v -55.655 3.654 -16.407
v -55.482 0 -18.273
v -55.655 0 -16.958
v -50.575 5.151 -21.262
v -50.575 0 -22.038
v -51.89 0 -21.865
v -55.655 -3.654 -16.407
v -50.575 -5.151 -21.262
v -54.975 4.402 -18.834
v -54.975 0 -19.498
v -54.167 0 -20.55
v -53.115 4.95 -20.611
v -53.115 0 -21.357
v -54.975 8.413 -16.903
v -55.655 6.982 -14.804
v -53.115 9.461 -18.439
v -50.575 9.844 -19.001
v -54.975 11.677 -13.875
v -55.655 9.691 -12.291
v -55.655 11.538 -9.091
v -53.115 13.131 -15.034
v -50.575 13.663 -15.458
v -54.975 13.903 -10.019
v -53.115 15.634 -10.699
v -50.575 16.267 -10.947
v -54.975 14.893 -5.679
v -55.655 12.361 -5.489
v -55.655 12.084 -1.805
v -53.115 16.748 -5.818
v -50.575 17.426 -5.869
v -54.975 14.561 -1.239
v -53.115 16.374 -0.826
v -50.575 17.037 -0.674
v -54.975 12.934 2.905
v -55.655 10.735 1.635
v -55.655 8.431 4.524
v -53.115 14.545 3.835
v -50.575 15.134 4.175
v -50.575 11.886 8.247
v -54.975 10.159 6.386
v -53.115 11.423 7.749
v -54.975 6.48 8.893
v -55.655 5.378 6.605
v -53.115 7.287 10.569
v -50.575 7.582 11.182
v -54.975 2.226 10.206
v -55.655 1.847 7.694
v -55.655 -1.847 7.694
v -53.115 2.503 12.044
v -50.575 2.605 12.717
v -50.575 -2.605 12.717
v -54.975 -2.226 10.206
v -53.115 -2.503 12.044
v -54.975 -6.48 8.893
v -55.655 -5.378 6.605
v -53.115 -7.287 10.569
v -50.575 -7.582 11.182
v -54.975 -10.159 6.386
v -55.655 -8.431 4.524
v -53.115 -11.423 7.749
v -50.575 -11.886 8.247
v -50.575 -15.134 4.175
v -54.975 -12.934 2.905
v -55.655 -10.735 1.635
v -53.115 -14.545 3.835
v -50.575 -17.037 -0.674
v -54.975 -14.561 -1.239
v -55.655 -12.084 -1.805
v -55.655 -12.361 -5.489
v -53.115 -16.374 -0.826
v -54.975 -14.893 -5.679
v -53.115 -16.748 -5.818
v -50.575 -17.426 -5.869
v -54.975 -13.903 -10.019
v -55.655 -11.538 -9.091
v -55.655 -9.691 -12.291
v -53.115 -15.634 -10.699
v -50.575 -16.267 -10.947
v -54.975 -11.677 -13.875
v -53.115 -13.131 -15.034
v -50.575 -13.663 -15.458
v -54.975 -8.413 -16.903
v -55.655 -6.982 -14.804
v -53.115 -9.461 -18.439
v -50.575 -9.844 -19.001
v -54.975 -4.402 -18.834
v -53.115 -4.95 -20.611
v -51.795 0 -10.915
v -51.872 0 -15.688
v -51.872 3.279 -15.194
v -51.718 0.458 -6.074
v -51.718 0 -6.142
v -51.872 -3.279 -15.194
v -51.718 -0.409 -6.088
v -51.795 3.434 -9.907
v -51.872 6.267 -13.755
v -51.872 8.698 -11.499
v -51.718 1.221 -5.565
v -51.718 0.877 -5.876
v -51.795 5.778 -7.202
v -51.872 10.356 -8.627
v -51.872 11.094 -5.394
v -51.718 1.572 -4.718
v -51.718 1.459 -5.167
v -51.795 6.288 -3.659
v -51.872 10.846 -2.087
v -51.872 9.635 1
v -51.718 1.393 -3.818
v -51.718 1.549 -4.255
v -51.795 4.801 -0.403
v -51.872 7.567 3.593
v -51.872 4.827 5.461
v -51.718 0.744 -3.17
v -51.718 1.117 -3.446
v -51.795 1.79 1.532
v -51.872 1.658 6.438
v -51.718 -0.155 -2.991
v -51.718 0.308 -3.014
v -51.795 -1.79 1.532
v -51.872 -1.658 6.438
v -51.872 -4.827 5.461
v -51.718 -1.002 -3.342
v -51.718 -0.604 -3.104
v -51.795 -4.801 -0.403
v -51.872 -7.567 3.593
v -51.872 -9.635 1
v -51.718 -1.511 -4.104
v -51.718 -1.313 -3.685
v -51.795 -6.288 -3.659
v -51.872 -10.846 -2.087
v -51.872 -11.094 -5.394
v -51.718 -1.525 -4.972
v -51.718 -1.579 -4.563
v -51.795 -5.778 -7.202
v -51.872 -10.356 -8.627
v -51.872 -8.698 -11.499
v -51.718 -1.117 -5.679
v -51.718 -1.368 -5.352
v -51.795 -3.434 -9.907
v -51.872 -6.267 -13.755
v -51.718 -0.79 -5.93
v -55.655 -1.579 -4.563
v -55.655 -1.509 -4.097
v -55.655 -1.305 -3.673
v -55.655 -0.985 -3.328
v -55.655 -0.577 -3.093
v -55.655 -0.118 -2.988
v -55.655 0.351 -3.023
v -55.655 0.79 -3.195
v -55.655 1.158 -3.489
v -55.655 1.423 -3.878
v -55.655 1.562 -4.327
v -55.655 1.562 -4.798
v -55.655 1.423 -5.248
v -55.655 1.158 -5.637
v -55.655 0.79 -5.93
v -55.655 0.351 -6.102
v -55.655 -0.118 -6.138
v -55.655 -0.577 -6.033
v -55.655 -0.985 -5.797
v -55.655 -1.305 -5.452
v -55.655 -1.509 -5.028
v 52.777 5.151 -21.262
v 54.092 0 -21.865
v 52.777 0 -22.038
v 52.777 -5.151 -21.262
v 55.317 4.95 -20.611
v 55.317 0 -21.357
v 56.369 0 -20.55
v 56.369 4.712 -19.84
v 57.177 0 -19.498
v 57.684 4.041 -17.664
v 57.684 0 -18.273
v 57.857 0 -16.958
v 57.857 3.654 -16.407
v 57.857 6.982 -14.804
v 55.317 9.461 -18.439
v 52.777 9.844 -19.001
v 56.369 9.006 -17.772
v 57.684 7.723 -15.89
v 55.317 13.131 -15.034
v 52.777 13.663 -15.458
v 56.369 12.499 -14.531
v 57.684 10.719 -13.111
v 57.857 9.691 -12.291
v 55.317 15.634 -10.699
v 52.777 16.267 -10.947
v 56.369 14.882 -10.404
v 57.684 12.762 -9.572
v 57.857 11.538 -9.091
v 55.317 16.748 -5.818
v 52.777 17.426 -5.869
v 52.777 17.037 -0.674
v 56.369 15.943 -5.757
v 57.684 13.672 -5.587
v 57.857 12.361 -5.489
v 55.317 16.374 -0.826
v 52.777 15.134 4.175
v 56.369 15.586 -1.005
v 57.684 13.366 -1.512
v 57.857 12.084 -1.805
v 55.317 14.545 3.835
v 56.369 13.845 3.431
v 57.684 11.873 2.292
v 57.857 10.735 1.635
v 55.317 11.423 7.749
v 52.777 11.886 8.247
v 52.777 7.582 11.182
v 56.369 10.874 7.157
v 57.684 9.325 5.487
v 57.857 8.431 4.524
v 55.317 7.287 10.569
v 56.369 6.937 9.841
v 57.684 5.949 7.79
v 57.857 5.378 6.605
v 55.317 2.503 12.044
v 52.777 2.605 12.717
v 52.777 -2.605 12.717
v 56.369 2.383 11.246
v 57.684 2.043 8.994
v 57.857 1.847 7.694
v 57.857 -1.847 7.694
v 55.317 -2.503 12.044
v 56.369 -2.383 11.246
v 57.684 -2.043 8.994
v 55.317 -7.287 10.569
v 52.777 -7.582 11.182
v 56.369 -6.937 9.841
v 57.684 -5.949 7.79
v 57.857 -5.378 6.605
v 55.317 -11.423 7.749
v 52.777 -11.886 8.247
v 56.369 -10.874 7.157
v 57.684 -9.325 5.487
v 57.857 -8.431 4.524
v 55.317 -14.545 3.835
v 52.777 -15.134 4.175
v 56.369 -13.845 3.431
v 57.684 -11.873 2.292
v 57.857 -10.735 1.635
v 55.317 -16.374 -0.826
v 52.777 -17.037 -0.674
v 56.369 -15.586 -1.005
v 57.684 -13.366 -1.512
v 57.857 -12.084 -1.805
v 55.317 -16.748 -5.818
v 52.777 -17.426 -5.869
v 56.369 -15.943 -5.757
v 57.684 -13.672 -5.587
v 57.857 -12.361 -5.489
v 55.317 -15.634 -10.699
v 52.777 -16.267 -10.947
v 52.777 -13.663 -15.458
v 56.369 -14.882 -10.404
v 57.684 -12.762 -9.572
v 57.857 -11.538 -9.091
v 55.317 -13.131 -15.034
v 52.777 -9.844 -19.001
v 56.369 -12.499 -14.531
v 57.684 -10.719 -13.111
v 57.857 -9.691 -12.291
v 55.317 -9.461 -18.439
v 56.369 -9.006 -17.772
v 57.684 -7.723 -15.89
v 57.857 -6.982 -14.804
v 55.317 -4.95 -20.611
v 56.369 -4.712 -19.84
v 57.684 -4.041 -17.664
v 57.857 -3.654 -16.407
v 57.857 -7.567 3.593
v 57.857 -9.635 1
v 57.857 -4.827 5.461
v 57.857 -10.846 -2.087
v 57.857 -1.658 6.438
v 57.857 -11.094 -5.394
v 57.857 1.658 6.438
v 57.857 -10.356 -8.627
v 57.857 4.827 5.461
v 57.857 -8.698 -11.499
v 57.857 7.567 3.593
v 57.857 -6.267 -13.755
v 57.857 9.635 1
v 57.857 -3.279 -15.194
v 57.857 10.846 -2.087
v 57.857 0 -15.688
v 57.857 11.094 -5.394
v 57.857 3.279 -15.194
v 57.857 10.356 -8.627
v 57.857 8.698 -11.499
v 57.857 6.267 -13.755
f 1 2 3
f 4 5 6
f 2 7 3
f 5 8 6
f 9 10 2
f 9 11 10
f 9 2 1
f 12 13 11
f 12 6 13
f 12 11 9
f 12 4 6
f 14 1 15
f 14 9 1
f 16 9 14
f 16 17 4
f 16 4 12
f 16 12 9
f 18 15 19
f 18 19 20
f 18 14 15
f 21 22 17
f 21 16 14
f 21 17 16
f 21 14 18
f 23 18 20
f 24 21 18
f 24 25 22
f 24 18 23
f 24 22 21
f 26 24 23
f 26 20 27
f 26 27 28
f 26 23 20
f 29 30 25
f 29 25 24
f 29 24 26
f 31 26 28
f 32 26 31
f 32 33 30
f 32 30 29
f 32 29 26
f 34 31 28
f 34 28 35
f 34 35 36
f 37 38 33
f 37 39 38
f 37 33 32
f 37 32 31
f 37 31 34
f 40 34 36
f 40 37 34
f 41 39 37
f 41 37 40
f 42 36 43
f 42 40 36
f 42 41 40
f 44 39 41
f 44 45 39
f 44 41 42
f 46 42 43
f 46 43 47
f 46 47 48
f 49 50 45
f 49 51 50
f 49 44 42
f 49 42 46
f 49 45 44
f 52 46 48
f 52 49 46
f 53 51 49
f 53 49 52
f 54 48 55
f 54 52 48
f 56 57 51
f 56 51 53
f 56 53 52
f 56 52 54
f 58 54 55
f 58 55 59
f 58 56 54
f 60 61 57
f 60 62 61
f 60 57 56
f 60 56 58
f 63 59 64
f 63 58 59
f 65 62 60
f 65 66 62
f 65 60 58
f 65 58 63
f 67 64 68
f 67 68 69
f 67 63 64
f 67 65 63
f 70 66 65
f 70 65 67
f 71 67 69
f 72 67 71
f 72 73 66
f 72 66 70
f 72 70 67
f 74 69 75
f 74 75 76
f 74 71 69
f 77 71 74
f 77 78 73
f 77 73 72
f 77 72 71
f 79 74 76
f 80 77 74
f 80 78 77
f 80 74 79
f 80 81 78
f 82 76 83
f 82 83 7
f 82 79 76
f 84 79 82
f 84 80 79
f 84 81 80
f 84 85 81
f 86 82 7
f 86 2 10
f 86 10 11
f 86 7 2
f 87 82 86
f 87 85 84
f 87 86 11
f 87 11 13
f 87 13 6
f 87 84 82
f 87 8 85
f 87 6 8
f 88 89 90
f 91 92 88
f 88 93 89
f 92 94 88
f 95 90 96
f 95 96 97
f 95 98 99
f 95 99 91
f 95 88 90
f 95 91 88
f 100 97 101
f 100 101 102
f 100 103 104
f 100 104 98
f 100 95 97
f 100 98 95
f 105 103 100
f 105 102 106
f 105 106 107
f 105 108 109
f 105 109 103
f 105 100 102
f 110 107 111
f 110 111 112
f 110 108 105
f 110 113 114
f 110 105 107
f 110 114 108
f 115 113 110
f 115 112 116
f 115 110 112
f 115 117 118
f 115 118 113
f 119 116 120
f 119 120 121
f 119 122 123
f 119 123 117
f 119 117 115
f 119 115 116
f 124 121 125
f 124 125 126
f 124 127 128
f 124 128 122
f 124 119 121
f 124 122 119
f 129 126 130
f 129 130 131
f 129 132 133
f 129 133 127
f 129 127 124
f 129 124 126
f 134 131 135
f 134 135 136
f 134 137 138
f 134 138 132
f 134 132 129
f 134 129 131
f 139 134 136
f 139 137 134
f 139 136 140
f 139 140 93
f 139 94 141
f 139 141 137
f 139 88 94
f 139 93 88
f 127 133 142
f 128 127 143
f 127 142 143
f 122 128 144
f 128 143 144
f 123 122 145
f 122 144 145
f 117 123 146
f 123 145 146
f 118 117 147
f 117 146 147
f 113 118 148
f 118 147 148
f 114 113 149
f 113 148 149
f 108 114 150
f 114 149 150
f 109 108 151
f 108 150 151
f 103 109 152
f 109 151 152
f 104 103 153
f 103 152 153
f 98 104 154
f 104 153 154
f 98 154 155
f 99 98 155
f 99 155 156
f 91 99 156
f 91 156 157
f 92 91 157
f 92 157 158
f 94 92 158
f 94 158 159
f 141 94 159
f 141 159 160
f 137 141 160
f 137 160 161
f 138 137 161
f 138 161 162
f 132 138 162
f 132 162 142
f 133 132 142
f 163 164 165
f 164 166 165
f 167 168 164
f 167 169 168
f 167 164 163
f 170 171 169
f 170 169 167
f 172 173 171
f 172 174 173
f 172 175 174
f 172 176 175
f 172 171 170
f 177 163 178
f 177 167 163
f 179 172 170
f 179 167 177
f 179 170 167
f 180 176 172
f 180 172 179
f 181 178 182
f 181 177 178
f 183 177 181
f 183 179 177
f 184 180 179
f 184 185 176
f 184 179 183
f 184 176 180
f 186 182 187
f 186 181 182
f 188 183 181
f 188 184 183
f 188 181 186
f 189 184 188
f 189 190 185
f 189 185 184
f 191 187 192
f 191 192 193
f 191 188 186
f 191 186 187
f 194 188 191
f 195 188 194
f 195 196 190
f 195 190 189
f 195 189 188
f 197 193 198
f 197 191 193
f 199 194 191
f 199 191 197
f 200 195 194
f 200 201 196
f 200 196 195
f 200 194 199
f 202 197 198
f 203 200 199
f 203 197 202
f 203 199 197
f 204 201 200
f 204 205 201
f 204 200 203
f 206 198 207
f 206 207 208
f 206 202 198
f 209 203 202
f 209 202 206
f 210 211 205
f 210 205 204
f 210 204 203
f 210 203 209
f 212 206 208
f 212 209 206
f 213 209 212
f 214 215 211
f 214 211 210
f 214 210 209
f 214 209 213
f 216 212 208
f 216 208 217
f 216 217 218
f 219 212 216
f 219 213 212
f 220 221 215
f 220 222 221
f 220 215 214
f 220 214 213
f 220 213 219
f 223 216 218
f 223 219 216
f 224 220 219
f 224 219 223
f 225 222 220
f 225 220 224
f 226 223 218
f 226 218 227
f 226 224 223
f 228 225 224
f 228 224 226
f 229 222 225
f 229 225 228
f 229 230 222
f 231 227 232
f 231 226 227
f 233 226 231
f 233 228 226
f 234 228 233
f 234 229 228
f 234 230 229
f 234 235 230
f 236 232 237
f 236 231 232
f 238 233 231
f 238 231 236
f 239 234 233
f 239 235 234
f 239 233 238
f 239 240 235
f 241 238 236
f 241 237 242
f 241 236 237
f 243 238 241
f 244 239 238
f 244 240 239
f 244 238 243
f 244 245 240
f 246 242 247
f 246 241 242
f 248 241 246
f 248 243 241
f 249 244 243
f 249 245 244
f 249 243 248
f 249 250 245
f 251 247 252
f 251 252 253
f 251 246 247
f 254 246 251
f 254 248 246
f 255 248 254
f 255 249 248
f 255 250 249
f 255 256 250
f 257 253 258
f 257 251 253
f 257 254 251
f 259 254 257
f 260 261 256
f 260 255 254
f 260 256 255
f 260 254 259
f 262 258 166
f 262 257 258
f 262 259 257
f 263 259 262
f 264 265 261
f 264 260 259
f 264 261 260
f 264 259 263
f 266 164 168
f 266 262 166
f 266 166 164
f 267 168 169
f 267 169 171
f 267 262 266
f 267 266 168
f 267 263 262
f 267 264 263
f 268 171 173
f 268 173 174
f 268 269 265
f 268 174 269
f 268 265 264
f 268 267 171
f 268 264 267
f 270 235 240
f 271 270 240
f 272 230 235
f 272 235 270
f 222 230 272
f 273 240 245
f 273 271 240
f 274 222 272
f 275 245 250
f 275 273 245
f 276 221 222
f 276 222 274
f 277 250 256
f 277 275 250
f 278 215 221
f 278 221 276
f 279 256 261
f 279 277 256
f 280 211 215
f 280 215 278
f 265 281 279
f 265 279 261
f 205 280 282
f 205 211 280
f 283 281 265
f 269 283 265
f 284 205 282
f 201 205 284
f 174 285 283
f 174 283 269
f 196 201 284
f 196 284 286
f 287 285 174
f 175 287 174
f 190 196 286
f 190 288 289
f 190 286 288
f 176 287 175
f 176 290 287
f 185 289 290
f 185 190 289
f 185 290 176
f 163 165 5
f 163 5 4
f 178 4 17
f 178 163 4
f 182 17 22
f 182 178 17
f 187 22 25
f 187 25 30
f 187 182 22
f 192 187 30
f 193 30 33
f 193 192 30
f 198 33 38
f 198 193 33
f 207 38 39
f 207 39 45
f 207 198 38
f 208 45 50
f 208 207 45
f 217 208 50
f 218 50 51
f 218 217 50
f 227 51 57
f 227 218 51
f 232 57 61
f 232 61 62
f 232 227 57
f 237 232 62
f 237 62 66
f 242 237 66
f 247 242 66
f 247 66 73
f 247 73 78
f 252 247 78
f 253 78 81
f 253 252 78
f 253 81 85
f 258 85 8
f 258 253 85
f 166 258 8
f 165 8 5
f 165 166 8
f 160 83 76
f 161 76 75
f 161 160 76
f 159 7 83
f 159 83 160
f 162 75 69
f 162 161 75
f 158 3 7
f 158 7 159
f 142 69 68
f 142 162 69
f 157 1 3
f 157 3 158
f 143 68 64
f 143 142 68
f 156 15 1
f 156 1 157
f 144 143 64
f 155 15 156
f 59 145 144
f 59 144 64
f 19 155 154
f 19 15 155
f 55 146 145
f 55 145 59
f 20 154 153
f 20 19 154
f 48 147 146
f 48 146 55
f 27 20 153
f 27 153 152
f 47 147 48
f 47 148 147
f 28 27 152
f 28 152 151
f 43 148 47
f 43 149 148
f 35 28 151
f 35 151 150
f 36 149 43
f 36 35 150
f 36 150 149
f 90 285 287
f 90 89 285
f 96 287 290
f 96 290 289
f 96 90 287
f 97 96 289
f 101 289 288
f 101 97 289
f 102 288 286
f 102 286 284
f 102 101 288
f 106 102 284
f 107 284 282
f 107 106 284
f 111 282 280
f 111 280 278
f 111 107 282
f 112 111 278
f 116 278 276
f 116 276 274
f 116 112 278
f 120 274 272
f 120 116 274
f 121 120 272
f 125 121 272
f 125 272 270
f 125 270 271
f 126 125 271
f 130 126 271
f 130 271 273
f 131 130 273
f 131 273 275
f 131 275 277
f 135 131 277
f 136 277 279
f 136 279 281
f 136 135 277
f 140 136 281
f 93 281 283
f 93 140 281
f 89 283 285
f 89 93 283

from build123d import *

# Parameters (mm, degrees)
F2_R     = 5.08
F3_R     = 1.5792617016
F4_DEPTH = 25.4


with BuildPart() as f1:
    # F0 (on Front) → F1 (revolve)
    with BuildSketch(Plane.XZ):
        Polygon((-55.6552457488, -4.5627619832), (-55.6552457488, -22.0379619832), (57.8573542512, -22.0379619832), (57.8573542512, -15.6879619832), (-51.8719255924, -15.6879619832), (-51.6928457488, -4.5627619832), align=None)
    revolve(axis=Axis((-53.6740457488, 0, -4.5627619832), (1, 0, 0)))

    # F2
    f2_edges = [f1.edges().sort_by_distance(p)[0] for p in [
        (57.857354, 0, 12.912438),
        (-55.655246, 0, 12.912438),
    ]]
    fillet(f2_edges, radius=F2_R)

    # F3 (on face) → F4 (cut)
    with BuildSketch(Plane(origin=(-55.6552457488, 0, 0), x_dir=(0, -1, 0), z_dir=(-1, 0, 0))):
        with Locations((0, -4.5627619832)):
            Circle(F3_R)
    extrude(amount=-F4_DEPTH, mode=Mode.SUBTRACT)


solid = f1.part
